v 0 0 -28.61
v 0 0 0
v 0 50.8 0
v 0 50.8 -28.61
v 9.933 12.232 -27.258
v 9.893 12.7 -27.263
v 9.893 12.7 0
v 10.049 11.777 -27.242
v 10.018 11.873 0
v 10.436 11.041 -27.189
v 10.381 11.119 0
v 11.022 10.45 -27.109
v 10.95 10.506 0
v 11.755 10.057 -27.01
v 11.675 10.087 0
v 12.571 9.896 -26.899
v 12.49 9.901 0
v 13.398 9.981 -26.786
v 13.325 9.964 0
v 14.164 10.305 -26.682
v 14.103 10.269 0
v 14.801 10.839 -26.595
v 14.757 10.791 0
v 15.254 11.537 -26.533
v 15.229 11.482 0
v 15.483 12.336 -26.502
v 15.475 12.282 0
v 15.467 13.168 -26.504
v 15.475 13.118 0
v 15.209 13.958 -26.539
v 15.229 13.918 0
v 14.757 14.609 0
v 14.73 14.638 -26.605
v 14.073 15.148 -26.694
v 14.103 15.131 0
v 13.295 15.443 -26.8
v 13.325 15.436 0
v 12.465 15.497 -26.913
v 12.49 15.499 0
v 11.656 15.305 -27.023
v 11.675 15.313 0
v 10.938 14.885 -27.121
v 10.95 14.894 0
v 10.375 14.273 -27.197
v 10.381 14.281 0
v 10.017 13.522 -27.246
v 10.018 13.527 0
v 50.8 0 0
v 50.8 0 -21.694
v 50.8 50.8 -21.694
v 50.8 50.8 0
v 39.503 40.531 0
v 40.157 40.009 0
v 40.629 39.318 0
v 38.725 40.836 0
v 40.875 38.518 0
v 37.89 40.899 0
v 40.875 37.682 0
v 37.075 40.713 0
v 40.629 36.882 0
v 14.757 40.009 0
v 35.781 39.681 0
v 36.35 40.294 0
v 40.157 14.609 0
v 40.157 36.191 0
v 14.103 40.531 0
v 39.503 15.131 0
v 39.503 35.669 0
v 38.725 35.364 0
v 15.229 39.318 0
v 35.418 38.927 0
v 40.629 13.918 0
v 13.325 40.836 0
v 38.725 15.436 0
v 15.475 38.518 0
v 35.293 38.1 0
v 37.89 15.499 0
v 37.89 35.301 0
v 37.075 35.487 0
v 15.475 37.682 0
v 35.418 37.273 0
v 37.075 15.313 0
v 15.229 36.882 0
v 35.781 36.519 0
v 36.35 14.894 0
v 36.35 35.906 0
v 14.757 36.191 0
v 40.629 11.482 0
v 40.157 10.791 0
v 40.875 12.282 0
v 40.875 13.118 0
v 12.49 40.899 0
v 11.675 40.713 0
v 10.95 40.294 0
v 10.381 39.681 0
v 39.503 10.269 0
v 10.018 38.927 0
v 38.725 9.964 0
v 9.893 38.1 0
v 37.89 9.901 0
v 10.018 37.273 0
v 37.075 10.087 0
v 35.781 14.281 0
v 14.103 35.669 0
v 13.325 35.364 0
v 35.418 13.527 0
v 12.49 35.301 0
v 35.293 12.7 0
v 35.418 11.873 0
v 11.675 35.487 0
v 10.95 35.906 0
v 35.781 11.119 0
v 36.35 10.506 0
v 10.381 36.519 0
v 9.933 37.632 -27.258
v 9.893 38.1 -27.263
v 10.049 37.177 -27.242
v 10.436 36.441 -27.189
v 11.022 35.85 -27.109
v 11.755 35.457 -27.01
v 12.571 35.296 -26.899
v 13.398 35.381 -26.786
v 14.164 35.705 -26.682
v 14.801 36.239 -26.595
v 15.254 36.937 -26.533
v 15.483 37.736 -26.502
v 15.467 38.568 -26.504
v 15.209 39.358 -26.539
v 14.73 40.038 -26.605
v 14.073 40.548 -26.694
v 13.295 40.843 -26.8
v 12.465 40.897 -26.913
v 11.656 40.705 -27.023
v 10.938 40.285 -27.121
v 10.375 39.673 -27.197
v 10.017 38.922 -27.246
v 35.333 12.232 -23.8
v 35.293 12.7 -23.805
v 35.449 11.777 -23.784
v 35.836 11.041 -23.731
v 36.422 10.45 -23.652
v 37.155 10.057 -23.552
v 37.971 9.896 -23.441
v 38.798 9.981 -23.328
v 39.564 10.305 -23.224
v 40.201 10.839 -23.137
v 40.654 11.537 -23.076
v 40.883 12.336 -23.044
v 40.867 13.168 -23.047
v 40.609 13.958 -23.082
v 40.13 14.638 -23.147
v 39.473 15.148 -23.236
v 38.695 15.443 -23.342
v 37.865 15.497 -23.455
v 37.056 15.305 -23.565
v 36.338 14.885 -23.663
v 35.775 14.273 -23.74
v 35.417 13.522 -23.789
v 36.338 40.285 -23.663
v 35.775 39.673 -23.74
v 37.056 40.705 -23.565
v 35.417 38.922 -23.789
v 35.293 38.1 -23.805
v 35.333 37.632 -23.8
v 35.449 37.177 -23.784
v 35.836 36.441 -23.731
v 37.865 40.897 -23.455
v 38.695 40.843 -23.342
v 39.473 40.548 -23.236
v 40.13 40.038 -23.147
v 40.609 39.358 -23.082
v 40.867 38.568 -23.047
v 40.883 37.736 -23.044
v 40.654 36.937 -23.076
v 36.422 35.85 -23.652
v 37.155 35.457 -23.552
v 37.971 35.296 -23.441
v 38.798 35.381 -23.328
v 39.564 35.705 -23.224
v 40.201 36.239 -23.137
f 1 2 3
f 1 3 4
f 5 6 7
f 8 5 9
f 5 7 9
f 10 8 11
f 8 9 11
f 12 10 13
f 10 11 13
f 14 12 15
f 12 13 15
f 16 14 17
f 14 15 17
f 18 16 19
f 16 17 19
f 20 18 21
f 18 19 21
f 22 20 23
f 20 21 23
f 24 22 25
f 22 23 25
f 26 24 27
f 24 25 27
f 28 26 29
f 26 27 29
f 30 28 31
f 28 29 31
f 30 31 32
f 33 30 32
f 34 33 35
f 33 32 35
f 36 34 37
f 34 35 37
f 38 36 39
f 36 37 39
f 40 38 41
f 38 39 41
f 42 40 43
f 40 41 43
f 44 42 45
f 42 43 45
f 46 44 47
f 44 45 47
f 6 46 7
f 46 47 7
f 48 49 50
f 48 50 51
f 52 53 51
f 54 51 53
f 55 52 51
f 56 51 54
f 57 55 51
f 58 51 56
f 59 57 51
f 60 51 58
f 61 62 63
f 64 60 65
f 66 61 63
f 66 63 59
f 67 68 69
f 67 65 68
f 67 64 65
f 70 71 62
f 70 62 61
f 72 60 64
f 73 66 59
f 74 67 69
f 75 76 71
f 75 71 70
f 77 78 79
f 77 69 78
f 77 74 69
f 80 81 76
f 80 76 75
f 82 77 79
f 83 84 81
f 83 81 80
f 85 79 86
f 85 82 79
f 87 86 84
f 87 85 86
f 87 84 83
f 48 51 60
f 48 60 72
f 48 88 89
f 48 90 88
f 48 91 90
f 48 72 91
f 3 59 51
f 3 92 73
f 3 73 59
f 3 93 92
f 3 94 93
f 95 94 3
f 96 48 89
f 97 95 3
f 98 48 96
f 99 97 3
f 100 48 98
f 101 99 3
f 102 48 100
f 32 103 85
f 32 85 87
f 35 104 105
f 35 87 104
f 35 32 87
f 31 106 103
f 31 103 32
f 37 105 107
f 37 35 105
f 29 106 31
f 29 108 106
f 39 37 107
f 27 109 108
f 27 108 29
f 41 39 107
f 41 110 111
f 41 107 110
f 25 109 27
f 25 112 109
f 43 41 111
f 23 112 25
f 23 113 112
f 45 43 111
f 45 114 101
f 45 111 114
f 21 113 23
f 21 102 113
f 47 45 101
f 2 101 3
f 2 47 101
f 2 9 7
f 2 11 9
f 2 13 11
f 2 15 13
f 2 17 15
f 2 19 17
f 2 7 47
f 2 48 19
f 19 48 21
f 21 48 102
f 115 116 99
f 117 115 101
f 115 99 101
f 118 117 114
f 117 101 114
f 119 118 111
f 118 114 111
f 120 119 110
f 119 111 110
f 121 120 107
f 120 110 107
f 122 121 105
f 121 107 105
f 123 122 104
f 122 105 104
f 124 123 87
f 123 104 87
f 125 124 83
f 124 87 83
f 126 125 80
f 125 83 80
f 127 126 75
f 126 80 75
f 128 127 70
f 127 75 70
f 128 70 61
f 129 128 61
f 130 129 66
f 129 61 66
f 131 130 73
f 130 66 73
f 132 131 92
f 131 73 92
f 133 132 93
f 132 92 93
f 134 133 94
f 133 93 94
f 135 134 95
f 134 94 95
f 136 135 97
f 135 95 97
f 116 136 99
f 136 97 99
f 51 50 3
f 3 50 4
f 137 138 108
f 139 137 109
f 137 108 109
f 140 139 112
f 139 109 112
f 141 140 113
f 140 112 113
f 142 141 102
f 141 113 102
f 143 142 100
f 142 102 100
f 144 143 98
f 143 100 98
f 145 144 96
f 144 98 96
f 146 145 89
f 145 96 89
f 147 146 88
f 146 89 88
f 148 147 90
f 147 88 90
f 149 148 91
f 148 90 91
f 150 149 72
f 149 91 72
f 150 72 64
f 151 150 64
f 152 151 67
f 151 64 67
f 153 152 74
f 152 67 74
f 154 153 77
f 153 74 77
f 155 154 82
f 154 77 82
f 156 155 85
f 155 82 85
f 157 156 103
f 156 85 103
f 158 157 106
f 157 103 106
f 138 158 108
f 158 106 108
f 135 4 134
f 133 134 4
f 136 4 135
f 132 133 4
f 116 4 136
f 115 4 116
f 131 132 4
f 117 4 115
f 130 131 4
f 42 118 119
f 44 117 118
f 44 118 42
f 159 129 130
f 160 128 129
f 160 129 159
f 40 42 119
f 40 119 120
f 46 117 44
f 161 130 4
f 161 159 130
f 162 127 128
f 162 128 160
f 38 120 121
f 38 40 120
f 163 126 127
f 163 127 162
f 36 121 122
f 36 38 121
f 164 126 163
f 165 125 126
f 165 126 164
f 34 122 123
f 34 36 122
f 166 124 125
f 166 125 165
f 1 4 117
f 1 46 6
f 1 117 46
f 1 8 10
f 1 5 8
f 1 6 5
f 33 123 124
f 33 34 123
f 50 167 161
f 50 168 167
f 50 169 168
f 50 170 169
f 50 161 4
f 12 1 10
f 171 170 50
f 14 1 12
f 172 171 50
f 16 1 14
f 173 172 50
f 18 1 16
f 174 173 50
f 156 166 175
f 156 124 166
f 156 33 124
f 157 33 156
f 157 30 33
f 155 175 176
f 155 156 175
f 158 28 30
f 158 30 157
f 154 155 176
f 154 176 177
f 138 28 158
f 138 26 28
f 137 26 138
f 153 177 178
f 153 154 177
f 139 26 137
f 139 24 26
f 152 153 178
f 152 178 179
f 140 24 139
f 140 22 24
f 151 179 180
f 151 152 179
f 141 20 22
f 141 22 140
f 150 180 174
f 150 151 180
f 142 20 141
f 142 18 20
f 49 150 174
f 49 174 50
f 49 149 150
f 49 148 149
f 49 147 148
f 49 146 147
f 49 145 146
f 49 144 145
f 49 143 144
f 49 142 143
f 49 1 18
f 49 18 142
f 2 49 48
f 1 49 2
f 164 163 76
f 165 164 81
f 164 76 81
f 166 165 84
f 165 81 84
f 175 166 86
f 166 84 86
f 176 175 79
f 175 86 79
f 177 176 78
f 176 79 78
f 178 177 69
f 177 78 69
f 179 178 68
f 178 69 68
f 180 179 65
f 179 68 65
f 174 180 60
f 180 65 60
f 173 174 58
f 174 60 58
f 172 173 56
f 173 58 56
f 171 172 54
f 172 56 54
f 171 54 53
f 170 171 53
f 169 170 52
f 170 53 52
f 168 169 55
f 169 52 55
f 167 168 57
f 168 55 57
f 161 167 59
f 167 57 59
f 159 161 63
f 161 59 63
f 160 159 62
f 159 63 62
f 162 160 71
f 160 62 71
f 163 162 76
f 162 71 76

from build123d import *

# Parameters (mm, degrees)
BOSS_EXTRUDE1_DEPTH                                = 50.8
CSK_FOR_10_FLAT_HEAD_MACHINE_SCREW_100_D           = 5.6134
CSK_FOR_10_FLAT_HEAD_MACHINE_SCREW_100_CSINK_D     = 17.78
CSK_FOR_10_FLAT_HEAD_MACHINE_SCREW_100_CSINK_ANGLE = 90
CSK_FOR_10_FLAT_HEAD_MACHINE_SCREW_2_D             = 5.6134
CSK_FOR_10_FLAT_HEAD_MACHINE_SCREW_2_CSINK_D       = 17.78
CSK_FOR_10_FLAT_HEAD_MACHINE_SCREW_2_CSINK_ANGLE   = 90


with BuildPart() as part:
    # Sketch1 → Boss-Extrude1 (new body)
    with BuildSketch(Plane(origin=(0, 0, 0), x_dir=(1, 0, 0), z_dir=(0, 1, 0))):
        Polygon((50.8, 0), (0, 0), (0, 28.609796644), (50.8, 21.69437447), align=None)
    extrude(amount=BOSS_EXTRUDE1_DEPTH)

    # CSK for _10 Flat Head Machine Screw _100 (through all)
    with Locations(Plane(origin=(320.741972913, -316.395089466, -35.56), x_dir=(1, 0, 0), z_dir=(0, 0, -1))):
        with Locations((-308.041854919, -227.495089466), (-308.041854919, -252.895089466), (-308.041972913, -329.095089466), (-308.041972913, -354.495089466)):
            CounterSinkHole(CSK_FOR_10_FLAT_HEAD_MACHINE_SCREW_100_D / 2, CSK_FOR_10_FLAT_HEAD_MACHINE_SCREW_100_CSINK_D / 2, counter_sink_angle=CSK_FOR_10_FLAT_HEAD_MACHINE_SCREW_100_CSINK_ANGLE)

    # CSK for _10 Flat Head Machine Screw  2 (through all)
    with Locations(Plane(origin=(320.741972913, -316.395089466, -33.02), x_dir=(1, 0, 0), z_dir=(0, 0, -1))):
        with Locations((-282.641854919, -227.495089466), (-282.641854919, -252.895089466), (-282.641972913, -329.095089466), (-282.641972913, -354.495089466)):
            CounterSinkHole(CSK_FOR_10_FLAT_HEAD_MACHINE_SCREW_2_D / 2, CSK_FOR_10_FLAT_HEAD_MACHINE_SCREW_2_CSINK_D / 2, counter_sink_angle=CSK_FOR_10_FLAT_HEAD_MACHINE_SCREW_2_CSINK_ANGLE)


solid = part.part
